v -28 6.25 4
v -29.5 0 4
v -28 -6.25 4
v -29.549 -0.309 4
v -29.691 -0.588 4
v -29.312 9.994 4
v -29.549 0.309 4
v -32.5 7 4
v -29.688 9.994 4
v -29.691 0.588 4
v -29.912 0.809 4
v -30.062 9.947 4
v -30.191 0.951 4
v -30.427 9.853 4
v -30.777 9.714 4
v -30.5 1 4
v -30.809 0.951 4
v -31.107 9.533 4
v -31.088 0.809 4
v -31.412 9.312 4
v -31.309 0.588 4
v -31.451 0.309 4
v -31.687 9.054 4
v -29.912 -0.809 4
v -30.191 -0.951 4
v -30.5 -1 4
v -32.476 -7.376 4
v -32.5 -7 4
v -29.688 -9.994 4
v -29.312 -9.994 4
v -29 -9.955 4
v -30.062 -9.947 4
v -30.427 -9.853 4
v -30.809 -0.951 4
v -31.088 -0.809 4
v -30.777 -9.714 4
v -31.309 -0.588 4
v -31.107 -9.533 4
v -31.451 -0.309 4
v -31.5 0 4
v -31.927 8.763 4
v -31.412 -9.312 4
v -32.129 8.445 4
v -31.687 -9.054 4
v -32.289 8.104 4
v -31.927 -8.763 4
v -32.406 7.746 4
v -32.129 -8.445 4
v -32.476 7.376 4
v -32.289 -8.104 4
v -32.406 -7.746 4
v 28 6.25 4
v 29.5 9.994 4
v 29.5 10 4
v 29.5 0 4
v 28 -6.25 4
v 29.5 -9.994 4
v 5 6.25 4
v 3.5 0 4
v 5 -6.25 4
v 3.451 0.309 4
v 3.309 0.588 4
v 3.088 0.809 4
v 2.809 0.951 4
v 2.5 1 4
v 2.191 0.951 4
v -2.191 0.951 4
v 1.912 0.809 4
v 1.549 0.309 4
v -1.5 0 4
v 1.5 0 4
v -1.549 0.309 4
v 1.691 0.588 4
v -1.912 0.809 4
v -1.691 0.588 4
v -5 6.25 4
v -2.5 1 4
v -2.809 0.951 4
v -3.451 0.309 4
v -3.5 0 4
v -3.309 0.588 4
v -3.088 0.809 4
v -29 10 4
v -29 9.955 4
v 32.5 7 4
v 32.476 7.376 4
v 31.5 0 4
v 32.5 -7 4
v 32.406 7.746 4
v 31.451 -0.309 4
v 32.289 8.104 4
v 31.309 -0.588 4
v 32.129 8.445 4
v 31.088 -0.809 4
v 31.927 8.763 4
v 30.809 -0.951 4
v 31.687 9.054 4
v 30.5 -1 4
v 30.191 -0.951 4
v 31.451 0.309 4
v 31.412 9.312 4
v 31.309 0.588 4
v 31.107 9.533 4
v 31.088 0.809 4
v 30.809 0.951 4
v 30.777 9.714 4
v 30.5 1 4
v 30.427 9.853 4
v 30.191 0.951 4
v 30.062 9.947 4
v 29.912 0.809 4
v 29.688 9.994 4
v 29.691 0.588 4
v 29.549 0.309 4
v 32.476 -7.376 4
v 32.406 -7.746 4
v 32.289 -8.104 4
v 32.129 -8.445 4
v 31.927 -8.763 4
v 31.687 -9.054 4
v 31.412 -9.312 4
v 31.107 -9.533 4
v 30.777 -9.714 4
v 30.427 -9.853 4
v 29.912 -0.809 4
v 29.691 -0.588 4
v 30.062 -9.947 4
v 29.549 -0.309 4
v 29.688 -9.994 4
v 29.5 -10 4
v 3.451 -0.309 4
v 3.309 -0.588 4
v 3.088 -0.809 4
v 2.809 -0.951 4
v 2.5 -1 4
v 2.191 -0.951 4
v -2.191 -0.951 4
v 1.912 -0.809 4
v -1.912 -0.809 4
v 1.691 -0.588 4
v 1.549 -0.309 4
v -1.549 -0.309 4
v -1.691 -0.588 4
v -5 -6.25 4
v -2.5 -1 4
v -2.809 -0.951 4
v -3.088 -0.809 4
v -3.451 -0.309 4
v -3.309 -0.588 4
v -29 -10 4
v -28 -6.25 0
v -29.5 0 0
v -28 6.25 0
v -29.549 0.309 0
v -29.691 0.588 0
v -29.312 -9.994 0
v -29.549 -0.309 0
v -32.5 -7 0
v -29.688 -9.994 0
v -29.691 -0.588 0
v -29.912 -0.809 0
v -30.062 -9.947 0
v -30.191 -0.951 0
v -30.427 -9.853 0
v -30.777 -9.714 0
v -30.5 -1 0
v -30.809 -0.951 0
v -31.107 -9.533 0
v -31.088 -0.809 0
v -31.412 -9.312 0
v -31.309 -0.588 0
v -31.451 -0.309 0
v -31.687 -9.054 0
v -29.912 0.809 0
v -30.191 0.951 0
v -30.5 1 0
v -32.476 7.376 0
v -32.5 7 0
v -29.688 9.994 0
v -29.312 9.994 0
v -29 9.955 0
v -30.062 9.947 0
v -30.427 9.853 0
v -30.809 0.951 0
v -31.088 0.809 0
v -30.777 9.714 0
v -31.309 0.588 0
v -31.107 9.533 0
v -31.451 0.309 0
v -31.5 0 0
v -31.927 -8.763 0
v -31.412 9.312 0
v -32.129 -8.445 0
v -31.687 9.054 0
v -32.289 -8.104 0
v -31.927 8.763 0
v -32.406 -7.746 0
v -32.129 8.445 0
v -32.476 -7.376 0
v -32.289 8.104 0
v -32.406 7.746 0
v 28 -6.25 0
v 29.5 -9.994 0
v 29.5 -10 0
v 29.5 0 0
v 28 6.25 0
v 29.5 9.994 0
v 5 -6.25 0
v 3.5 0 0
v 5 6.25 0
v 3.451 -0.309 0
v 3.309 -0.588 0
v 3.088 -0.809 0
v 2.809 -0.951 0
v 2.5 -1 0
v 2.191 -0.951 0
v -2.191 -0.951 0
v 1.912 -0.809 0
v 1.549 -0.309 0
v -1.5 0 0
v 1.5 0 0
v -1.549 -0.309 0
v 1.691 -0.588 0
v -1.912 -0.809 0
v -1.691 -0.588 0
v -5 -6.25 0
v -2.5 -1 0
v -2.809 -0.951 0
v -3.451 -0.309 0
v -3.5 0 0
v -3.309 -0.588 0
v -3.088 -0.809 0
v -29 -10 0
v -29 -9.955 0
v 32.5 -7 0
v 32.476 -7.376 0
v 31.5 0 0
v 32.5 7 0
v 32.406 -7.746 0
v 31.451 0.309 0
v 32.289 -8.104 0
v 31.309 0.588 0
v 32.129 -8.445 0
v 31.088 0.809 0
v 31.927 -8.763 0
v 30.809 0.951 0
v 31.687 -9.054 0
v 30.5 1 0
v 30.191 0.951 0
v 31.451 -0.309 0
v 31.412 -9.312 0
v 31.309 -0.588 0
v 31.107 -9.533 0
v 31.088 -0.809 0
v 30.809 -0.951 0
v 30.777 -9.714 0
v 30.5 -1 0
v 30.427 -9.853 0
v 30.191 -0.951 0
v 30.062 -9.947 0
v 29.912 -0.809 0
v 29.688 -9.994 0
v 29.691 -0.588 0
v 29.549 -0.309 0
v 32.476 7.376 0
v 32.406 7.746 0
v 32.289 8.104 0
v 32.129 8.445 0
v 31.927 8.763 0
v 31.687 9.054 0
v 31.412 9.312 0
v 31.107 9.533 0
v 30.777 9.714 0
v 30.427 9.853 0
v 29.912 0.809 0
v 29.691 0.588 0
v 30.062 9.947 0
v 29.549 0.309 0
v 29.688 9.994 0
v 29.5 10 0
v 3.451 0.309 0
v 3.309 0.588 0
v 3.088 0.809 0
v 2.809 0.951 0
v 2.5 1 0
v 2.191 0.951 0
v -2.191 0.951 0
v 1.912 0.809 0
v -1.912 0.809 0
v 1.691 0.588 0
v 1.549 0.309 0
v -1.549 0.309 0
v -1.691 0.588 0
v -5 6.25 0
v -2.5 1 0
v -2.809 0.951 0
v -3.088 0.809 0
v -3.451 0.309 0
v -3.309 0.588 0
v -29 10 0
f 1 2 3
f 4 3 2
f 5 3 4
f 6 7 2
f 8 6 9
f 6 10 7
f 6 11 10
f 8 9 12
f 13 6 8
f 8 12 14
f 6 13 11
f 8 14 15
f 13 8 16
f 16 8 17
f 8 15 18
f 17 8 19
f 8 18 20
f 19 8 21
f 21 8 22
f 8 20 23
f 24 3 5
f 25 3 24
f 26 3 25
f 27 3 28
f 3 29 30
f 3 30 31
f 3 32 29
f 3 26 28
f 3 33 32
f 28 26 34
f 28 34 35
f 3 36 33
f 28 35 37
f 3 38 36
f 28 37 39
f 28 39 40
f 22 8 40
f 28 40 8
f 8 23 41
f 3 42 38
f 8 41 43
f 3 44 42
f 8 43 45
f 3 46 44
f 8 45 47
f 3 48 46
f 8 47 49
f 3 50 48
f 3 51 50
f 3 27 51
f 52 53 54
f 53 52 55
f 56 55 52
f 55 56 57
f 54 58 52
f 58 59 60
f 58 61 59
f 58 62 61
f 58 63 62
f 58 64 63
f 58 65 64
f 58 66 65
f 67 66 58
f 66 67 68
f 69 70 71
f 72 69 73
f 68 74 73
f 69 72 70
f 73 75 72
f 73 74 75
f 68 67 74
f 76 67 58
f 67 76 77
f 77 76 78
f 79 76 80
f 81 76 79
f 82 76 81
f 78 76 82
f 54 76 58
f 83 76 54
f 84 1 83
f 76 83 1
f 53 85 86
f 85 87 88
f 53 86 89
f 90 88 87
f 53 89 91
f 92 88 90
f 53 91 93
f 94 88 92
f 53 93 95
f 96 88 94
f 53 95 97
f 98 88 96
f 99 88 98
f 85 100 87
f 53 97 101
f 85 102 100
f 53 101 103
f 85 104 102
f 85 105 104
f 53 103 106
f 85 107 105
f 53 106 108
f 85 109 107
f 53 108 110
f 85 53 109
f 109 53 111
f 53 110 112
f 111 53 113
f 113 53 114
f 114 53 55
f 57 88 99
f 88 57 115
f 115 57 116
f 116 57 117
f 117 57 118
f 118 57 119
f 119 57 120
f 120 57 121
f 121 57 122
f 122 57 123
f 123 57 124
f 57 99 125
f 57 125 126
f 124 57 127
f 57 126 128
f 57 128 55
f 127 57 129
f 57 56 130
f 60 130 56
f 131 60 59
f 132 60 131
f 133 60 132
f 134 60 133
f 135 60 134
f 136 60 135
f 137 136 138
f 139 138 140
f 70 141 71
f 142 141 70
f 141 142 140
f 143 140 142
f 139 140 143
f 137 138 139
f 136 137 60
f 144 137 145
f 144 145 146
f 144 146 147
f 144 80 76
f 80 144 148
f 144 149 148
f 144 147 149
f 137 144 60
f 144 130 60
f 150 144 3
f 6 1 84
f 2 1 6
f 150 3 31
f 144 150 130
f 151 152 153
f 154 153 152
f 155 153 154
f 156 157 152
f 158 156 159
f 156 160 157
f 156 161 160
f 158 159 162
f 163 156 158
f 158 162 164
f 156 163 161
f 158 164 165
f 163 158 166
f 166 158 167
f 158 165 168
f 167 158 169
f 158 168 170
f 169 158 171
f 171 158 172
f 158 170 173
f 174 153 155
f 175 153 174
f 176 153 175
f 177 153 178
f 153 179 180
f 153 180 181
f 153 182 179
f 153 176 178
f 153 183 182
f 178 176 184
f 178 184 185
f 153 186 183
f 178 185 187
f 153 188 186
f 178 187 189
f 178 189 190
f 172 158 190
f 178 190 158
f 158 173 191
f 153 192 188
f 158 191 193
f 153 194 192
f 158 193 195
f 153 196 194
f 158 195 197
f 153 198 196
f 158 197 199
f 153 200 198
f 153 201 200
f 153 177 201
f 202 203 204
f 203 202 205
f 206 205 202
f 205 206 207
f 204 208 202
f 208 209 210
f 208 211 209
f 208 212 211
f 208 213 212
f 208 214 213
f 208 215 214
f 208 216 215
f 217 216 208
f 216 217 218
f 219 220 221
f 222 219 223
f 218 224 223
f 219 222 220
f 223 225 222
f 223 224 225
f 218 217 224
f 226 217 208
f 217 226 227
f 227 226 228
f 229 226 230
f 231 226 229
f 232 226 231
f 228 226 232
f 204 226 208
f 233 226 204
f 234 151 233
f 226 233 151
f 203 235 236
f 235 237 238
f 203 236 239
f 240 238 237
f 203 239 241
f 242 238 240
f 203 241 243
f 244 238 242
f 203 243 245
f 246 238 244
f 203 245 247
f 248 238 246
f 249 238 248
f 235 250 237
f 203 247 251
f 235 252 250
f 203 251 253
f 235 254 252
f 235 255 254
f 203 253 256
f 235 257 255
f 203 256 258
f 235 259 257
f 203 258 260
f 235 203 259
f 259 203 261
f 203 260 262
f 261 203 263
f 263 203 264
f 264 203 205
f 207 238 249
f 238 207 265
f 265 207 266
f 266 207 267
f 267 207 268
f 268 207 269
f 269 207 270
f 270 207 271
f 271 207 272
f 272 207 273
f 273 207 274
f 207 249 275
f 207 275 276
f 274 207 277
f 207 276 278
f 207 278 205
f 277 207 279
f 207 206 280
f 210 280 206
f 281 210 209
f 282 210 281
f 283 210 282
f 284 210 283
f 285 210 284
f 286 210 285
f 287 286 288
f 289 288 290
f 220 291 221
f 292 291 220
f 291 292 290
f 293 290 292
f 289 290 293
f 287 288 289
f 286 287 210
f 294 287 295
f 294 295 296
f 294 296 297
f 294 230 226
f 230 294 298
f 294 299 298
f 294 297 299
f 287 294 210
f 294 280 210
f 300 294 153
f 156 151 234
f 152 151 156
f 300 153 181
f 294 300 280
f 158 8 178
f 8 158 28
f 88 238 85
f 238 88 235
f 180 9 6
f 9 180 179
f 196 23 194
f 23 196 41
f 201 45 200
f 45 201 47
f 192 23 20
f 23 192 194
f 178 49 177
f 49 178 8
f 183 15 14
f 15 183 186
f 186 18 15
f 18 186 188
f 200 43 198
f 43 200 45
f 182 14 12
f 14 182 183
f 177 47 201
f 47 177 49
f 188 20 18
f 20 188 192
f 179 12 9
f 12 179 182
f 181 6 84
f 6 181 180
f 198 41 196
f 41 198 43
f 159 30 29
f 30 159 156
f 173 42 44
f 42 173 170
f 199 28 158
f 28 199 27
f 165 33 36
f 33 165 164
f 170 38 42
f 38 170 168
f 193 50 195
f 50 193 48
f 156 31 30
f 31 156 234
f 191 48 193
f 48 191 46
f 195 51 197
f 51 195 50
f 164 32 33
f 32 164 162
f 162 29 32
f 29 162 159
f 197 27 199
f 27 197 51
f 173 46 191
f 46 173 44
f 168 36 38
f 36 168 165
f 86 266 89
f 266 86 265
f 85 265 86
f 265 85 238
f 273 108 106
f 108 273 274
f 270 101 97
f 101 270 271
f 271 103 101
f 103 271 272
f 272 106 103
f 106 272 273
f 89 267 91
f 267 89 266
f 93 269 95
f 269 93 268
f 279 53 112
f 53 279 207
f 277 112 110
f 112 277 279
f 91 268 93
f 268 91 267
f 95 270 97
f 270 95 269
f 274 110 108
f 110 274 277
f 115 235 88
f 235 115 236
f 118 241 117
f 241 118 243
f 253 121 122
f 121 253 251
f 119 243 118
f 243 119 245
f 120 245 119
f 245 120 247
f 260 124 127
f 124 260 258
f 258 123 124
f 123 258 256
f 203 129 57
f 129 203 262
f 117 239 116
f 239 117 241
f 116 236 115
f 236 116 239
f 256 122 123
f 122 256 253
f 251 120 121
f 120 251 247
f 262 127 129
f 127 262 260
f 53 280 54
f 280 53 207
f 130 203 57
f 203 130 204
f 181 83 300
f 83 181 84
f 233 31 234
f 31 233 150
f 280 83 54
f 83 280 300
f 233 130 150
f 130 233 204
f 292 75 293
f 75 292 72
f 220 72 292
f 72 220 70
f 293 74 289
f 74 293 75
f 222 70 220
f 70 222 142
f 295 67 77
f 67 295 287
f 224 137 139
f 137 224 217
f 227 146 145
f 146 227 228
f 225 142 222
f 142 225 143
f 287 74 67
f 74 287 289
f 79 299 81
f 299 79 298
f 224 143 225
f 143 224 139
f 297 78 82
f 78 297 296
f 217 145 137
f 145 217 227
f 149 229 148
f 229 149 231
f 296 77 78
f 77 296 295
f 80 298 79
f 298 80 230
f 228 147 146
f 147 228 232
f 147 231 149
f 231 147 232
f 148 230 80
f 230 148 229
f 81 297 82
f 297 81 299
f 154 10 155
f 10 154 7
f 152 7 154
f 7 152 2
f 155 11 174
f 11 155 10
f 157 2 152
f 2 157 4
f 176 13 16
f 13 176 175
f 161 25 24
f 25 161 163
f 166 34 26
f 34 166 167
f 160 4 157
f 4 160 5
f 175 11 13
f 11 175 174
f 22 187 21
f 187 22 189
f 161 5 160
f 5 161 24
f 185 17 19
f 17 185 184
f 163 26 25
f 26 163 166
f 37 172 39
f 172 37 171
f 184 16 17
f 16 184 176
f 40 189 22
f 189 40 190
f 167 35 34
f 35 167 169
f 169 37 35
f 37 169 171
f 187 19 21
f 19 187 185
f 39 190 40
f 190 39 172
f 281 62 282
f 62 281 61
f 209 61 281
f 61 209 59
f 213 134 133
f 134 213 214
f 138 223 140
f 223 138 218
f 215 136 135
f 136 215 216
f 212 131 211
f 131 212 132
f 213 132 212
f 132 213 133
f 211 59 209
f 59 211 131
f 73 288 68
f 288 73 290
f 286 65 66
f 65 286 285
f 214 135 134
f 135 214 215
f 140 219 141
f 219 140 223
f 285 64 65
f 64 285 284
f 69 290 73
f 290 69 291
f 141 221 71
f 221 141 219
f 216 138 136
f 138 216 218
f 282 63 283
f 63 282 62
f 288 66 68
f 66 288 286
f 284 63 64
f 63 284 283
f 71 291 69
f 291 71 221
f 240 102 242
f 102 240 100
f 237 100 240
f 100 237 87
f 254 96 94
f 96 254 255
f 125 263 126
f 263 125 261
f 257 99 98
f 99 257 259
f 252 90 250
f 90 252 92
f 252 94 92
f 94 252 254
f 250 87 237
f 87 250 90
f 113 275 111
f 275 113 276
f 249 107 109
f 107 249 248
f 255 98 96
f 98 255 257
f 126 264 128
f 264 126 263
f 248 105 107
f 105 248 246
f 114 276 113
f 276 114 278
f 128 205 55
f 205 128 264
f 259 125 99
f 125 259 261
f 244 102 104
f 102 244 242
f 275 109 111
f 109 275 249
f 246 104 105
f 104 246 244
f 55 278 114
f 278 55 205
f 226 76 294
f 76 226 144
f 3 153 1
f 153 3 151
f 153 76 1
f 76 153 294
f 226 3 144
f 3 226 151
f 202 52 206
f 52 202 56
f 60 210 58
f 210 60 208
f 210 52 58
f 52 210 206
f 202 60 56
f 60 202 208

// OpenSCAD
hip(23,12.5);

module hip(l,w){
   difference(){
      union(){
         //main
         translate([-29,-10,0]) cube([58.5,20,4]);

         //outside edges
         for (i = [[-32.5,-7,0],[26.5,-7,0]] ){
         	   translate(i) cube([6,14,4]);
         }

         //rounded corners
         for (i = [[-29.5,7,0],[-29.5,-7,0],[29.5,7,0],[29.5,-7,0]] ){
            translate(i) cylinder(r=3,h=4,$fn=50);
         }
      }
      
      //servo mount holes
      for (i = [[-2.5,0,-2],[-30.5,0,-2],[2.5,0,-2],[30.5,0,-2]] ){
         translate(i) cylinder(r=1,h=20,$fn=20);
      }
      
      //servo body cutouts
      for (i = [[-16.5,0,2],[16.5,0,2]] ){
         translate(i)  cube([l,w,22], center=true);
      }
   }
}
